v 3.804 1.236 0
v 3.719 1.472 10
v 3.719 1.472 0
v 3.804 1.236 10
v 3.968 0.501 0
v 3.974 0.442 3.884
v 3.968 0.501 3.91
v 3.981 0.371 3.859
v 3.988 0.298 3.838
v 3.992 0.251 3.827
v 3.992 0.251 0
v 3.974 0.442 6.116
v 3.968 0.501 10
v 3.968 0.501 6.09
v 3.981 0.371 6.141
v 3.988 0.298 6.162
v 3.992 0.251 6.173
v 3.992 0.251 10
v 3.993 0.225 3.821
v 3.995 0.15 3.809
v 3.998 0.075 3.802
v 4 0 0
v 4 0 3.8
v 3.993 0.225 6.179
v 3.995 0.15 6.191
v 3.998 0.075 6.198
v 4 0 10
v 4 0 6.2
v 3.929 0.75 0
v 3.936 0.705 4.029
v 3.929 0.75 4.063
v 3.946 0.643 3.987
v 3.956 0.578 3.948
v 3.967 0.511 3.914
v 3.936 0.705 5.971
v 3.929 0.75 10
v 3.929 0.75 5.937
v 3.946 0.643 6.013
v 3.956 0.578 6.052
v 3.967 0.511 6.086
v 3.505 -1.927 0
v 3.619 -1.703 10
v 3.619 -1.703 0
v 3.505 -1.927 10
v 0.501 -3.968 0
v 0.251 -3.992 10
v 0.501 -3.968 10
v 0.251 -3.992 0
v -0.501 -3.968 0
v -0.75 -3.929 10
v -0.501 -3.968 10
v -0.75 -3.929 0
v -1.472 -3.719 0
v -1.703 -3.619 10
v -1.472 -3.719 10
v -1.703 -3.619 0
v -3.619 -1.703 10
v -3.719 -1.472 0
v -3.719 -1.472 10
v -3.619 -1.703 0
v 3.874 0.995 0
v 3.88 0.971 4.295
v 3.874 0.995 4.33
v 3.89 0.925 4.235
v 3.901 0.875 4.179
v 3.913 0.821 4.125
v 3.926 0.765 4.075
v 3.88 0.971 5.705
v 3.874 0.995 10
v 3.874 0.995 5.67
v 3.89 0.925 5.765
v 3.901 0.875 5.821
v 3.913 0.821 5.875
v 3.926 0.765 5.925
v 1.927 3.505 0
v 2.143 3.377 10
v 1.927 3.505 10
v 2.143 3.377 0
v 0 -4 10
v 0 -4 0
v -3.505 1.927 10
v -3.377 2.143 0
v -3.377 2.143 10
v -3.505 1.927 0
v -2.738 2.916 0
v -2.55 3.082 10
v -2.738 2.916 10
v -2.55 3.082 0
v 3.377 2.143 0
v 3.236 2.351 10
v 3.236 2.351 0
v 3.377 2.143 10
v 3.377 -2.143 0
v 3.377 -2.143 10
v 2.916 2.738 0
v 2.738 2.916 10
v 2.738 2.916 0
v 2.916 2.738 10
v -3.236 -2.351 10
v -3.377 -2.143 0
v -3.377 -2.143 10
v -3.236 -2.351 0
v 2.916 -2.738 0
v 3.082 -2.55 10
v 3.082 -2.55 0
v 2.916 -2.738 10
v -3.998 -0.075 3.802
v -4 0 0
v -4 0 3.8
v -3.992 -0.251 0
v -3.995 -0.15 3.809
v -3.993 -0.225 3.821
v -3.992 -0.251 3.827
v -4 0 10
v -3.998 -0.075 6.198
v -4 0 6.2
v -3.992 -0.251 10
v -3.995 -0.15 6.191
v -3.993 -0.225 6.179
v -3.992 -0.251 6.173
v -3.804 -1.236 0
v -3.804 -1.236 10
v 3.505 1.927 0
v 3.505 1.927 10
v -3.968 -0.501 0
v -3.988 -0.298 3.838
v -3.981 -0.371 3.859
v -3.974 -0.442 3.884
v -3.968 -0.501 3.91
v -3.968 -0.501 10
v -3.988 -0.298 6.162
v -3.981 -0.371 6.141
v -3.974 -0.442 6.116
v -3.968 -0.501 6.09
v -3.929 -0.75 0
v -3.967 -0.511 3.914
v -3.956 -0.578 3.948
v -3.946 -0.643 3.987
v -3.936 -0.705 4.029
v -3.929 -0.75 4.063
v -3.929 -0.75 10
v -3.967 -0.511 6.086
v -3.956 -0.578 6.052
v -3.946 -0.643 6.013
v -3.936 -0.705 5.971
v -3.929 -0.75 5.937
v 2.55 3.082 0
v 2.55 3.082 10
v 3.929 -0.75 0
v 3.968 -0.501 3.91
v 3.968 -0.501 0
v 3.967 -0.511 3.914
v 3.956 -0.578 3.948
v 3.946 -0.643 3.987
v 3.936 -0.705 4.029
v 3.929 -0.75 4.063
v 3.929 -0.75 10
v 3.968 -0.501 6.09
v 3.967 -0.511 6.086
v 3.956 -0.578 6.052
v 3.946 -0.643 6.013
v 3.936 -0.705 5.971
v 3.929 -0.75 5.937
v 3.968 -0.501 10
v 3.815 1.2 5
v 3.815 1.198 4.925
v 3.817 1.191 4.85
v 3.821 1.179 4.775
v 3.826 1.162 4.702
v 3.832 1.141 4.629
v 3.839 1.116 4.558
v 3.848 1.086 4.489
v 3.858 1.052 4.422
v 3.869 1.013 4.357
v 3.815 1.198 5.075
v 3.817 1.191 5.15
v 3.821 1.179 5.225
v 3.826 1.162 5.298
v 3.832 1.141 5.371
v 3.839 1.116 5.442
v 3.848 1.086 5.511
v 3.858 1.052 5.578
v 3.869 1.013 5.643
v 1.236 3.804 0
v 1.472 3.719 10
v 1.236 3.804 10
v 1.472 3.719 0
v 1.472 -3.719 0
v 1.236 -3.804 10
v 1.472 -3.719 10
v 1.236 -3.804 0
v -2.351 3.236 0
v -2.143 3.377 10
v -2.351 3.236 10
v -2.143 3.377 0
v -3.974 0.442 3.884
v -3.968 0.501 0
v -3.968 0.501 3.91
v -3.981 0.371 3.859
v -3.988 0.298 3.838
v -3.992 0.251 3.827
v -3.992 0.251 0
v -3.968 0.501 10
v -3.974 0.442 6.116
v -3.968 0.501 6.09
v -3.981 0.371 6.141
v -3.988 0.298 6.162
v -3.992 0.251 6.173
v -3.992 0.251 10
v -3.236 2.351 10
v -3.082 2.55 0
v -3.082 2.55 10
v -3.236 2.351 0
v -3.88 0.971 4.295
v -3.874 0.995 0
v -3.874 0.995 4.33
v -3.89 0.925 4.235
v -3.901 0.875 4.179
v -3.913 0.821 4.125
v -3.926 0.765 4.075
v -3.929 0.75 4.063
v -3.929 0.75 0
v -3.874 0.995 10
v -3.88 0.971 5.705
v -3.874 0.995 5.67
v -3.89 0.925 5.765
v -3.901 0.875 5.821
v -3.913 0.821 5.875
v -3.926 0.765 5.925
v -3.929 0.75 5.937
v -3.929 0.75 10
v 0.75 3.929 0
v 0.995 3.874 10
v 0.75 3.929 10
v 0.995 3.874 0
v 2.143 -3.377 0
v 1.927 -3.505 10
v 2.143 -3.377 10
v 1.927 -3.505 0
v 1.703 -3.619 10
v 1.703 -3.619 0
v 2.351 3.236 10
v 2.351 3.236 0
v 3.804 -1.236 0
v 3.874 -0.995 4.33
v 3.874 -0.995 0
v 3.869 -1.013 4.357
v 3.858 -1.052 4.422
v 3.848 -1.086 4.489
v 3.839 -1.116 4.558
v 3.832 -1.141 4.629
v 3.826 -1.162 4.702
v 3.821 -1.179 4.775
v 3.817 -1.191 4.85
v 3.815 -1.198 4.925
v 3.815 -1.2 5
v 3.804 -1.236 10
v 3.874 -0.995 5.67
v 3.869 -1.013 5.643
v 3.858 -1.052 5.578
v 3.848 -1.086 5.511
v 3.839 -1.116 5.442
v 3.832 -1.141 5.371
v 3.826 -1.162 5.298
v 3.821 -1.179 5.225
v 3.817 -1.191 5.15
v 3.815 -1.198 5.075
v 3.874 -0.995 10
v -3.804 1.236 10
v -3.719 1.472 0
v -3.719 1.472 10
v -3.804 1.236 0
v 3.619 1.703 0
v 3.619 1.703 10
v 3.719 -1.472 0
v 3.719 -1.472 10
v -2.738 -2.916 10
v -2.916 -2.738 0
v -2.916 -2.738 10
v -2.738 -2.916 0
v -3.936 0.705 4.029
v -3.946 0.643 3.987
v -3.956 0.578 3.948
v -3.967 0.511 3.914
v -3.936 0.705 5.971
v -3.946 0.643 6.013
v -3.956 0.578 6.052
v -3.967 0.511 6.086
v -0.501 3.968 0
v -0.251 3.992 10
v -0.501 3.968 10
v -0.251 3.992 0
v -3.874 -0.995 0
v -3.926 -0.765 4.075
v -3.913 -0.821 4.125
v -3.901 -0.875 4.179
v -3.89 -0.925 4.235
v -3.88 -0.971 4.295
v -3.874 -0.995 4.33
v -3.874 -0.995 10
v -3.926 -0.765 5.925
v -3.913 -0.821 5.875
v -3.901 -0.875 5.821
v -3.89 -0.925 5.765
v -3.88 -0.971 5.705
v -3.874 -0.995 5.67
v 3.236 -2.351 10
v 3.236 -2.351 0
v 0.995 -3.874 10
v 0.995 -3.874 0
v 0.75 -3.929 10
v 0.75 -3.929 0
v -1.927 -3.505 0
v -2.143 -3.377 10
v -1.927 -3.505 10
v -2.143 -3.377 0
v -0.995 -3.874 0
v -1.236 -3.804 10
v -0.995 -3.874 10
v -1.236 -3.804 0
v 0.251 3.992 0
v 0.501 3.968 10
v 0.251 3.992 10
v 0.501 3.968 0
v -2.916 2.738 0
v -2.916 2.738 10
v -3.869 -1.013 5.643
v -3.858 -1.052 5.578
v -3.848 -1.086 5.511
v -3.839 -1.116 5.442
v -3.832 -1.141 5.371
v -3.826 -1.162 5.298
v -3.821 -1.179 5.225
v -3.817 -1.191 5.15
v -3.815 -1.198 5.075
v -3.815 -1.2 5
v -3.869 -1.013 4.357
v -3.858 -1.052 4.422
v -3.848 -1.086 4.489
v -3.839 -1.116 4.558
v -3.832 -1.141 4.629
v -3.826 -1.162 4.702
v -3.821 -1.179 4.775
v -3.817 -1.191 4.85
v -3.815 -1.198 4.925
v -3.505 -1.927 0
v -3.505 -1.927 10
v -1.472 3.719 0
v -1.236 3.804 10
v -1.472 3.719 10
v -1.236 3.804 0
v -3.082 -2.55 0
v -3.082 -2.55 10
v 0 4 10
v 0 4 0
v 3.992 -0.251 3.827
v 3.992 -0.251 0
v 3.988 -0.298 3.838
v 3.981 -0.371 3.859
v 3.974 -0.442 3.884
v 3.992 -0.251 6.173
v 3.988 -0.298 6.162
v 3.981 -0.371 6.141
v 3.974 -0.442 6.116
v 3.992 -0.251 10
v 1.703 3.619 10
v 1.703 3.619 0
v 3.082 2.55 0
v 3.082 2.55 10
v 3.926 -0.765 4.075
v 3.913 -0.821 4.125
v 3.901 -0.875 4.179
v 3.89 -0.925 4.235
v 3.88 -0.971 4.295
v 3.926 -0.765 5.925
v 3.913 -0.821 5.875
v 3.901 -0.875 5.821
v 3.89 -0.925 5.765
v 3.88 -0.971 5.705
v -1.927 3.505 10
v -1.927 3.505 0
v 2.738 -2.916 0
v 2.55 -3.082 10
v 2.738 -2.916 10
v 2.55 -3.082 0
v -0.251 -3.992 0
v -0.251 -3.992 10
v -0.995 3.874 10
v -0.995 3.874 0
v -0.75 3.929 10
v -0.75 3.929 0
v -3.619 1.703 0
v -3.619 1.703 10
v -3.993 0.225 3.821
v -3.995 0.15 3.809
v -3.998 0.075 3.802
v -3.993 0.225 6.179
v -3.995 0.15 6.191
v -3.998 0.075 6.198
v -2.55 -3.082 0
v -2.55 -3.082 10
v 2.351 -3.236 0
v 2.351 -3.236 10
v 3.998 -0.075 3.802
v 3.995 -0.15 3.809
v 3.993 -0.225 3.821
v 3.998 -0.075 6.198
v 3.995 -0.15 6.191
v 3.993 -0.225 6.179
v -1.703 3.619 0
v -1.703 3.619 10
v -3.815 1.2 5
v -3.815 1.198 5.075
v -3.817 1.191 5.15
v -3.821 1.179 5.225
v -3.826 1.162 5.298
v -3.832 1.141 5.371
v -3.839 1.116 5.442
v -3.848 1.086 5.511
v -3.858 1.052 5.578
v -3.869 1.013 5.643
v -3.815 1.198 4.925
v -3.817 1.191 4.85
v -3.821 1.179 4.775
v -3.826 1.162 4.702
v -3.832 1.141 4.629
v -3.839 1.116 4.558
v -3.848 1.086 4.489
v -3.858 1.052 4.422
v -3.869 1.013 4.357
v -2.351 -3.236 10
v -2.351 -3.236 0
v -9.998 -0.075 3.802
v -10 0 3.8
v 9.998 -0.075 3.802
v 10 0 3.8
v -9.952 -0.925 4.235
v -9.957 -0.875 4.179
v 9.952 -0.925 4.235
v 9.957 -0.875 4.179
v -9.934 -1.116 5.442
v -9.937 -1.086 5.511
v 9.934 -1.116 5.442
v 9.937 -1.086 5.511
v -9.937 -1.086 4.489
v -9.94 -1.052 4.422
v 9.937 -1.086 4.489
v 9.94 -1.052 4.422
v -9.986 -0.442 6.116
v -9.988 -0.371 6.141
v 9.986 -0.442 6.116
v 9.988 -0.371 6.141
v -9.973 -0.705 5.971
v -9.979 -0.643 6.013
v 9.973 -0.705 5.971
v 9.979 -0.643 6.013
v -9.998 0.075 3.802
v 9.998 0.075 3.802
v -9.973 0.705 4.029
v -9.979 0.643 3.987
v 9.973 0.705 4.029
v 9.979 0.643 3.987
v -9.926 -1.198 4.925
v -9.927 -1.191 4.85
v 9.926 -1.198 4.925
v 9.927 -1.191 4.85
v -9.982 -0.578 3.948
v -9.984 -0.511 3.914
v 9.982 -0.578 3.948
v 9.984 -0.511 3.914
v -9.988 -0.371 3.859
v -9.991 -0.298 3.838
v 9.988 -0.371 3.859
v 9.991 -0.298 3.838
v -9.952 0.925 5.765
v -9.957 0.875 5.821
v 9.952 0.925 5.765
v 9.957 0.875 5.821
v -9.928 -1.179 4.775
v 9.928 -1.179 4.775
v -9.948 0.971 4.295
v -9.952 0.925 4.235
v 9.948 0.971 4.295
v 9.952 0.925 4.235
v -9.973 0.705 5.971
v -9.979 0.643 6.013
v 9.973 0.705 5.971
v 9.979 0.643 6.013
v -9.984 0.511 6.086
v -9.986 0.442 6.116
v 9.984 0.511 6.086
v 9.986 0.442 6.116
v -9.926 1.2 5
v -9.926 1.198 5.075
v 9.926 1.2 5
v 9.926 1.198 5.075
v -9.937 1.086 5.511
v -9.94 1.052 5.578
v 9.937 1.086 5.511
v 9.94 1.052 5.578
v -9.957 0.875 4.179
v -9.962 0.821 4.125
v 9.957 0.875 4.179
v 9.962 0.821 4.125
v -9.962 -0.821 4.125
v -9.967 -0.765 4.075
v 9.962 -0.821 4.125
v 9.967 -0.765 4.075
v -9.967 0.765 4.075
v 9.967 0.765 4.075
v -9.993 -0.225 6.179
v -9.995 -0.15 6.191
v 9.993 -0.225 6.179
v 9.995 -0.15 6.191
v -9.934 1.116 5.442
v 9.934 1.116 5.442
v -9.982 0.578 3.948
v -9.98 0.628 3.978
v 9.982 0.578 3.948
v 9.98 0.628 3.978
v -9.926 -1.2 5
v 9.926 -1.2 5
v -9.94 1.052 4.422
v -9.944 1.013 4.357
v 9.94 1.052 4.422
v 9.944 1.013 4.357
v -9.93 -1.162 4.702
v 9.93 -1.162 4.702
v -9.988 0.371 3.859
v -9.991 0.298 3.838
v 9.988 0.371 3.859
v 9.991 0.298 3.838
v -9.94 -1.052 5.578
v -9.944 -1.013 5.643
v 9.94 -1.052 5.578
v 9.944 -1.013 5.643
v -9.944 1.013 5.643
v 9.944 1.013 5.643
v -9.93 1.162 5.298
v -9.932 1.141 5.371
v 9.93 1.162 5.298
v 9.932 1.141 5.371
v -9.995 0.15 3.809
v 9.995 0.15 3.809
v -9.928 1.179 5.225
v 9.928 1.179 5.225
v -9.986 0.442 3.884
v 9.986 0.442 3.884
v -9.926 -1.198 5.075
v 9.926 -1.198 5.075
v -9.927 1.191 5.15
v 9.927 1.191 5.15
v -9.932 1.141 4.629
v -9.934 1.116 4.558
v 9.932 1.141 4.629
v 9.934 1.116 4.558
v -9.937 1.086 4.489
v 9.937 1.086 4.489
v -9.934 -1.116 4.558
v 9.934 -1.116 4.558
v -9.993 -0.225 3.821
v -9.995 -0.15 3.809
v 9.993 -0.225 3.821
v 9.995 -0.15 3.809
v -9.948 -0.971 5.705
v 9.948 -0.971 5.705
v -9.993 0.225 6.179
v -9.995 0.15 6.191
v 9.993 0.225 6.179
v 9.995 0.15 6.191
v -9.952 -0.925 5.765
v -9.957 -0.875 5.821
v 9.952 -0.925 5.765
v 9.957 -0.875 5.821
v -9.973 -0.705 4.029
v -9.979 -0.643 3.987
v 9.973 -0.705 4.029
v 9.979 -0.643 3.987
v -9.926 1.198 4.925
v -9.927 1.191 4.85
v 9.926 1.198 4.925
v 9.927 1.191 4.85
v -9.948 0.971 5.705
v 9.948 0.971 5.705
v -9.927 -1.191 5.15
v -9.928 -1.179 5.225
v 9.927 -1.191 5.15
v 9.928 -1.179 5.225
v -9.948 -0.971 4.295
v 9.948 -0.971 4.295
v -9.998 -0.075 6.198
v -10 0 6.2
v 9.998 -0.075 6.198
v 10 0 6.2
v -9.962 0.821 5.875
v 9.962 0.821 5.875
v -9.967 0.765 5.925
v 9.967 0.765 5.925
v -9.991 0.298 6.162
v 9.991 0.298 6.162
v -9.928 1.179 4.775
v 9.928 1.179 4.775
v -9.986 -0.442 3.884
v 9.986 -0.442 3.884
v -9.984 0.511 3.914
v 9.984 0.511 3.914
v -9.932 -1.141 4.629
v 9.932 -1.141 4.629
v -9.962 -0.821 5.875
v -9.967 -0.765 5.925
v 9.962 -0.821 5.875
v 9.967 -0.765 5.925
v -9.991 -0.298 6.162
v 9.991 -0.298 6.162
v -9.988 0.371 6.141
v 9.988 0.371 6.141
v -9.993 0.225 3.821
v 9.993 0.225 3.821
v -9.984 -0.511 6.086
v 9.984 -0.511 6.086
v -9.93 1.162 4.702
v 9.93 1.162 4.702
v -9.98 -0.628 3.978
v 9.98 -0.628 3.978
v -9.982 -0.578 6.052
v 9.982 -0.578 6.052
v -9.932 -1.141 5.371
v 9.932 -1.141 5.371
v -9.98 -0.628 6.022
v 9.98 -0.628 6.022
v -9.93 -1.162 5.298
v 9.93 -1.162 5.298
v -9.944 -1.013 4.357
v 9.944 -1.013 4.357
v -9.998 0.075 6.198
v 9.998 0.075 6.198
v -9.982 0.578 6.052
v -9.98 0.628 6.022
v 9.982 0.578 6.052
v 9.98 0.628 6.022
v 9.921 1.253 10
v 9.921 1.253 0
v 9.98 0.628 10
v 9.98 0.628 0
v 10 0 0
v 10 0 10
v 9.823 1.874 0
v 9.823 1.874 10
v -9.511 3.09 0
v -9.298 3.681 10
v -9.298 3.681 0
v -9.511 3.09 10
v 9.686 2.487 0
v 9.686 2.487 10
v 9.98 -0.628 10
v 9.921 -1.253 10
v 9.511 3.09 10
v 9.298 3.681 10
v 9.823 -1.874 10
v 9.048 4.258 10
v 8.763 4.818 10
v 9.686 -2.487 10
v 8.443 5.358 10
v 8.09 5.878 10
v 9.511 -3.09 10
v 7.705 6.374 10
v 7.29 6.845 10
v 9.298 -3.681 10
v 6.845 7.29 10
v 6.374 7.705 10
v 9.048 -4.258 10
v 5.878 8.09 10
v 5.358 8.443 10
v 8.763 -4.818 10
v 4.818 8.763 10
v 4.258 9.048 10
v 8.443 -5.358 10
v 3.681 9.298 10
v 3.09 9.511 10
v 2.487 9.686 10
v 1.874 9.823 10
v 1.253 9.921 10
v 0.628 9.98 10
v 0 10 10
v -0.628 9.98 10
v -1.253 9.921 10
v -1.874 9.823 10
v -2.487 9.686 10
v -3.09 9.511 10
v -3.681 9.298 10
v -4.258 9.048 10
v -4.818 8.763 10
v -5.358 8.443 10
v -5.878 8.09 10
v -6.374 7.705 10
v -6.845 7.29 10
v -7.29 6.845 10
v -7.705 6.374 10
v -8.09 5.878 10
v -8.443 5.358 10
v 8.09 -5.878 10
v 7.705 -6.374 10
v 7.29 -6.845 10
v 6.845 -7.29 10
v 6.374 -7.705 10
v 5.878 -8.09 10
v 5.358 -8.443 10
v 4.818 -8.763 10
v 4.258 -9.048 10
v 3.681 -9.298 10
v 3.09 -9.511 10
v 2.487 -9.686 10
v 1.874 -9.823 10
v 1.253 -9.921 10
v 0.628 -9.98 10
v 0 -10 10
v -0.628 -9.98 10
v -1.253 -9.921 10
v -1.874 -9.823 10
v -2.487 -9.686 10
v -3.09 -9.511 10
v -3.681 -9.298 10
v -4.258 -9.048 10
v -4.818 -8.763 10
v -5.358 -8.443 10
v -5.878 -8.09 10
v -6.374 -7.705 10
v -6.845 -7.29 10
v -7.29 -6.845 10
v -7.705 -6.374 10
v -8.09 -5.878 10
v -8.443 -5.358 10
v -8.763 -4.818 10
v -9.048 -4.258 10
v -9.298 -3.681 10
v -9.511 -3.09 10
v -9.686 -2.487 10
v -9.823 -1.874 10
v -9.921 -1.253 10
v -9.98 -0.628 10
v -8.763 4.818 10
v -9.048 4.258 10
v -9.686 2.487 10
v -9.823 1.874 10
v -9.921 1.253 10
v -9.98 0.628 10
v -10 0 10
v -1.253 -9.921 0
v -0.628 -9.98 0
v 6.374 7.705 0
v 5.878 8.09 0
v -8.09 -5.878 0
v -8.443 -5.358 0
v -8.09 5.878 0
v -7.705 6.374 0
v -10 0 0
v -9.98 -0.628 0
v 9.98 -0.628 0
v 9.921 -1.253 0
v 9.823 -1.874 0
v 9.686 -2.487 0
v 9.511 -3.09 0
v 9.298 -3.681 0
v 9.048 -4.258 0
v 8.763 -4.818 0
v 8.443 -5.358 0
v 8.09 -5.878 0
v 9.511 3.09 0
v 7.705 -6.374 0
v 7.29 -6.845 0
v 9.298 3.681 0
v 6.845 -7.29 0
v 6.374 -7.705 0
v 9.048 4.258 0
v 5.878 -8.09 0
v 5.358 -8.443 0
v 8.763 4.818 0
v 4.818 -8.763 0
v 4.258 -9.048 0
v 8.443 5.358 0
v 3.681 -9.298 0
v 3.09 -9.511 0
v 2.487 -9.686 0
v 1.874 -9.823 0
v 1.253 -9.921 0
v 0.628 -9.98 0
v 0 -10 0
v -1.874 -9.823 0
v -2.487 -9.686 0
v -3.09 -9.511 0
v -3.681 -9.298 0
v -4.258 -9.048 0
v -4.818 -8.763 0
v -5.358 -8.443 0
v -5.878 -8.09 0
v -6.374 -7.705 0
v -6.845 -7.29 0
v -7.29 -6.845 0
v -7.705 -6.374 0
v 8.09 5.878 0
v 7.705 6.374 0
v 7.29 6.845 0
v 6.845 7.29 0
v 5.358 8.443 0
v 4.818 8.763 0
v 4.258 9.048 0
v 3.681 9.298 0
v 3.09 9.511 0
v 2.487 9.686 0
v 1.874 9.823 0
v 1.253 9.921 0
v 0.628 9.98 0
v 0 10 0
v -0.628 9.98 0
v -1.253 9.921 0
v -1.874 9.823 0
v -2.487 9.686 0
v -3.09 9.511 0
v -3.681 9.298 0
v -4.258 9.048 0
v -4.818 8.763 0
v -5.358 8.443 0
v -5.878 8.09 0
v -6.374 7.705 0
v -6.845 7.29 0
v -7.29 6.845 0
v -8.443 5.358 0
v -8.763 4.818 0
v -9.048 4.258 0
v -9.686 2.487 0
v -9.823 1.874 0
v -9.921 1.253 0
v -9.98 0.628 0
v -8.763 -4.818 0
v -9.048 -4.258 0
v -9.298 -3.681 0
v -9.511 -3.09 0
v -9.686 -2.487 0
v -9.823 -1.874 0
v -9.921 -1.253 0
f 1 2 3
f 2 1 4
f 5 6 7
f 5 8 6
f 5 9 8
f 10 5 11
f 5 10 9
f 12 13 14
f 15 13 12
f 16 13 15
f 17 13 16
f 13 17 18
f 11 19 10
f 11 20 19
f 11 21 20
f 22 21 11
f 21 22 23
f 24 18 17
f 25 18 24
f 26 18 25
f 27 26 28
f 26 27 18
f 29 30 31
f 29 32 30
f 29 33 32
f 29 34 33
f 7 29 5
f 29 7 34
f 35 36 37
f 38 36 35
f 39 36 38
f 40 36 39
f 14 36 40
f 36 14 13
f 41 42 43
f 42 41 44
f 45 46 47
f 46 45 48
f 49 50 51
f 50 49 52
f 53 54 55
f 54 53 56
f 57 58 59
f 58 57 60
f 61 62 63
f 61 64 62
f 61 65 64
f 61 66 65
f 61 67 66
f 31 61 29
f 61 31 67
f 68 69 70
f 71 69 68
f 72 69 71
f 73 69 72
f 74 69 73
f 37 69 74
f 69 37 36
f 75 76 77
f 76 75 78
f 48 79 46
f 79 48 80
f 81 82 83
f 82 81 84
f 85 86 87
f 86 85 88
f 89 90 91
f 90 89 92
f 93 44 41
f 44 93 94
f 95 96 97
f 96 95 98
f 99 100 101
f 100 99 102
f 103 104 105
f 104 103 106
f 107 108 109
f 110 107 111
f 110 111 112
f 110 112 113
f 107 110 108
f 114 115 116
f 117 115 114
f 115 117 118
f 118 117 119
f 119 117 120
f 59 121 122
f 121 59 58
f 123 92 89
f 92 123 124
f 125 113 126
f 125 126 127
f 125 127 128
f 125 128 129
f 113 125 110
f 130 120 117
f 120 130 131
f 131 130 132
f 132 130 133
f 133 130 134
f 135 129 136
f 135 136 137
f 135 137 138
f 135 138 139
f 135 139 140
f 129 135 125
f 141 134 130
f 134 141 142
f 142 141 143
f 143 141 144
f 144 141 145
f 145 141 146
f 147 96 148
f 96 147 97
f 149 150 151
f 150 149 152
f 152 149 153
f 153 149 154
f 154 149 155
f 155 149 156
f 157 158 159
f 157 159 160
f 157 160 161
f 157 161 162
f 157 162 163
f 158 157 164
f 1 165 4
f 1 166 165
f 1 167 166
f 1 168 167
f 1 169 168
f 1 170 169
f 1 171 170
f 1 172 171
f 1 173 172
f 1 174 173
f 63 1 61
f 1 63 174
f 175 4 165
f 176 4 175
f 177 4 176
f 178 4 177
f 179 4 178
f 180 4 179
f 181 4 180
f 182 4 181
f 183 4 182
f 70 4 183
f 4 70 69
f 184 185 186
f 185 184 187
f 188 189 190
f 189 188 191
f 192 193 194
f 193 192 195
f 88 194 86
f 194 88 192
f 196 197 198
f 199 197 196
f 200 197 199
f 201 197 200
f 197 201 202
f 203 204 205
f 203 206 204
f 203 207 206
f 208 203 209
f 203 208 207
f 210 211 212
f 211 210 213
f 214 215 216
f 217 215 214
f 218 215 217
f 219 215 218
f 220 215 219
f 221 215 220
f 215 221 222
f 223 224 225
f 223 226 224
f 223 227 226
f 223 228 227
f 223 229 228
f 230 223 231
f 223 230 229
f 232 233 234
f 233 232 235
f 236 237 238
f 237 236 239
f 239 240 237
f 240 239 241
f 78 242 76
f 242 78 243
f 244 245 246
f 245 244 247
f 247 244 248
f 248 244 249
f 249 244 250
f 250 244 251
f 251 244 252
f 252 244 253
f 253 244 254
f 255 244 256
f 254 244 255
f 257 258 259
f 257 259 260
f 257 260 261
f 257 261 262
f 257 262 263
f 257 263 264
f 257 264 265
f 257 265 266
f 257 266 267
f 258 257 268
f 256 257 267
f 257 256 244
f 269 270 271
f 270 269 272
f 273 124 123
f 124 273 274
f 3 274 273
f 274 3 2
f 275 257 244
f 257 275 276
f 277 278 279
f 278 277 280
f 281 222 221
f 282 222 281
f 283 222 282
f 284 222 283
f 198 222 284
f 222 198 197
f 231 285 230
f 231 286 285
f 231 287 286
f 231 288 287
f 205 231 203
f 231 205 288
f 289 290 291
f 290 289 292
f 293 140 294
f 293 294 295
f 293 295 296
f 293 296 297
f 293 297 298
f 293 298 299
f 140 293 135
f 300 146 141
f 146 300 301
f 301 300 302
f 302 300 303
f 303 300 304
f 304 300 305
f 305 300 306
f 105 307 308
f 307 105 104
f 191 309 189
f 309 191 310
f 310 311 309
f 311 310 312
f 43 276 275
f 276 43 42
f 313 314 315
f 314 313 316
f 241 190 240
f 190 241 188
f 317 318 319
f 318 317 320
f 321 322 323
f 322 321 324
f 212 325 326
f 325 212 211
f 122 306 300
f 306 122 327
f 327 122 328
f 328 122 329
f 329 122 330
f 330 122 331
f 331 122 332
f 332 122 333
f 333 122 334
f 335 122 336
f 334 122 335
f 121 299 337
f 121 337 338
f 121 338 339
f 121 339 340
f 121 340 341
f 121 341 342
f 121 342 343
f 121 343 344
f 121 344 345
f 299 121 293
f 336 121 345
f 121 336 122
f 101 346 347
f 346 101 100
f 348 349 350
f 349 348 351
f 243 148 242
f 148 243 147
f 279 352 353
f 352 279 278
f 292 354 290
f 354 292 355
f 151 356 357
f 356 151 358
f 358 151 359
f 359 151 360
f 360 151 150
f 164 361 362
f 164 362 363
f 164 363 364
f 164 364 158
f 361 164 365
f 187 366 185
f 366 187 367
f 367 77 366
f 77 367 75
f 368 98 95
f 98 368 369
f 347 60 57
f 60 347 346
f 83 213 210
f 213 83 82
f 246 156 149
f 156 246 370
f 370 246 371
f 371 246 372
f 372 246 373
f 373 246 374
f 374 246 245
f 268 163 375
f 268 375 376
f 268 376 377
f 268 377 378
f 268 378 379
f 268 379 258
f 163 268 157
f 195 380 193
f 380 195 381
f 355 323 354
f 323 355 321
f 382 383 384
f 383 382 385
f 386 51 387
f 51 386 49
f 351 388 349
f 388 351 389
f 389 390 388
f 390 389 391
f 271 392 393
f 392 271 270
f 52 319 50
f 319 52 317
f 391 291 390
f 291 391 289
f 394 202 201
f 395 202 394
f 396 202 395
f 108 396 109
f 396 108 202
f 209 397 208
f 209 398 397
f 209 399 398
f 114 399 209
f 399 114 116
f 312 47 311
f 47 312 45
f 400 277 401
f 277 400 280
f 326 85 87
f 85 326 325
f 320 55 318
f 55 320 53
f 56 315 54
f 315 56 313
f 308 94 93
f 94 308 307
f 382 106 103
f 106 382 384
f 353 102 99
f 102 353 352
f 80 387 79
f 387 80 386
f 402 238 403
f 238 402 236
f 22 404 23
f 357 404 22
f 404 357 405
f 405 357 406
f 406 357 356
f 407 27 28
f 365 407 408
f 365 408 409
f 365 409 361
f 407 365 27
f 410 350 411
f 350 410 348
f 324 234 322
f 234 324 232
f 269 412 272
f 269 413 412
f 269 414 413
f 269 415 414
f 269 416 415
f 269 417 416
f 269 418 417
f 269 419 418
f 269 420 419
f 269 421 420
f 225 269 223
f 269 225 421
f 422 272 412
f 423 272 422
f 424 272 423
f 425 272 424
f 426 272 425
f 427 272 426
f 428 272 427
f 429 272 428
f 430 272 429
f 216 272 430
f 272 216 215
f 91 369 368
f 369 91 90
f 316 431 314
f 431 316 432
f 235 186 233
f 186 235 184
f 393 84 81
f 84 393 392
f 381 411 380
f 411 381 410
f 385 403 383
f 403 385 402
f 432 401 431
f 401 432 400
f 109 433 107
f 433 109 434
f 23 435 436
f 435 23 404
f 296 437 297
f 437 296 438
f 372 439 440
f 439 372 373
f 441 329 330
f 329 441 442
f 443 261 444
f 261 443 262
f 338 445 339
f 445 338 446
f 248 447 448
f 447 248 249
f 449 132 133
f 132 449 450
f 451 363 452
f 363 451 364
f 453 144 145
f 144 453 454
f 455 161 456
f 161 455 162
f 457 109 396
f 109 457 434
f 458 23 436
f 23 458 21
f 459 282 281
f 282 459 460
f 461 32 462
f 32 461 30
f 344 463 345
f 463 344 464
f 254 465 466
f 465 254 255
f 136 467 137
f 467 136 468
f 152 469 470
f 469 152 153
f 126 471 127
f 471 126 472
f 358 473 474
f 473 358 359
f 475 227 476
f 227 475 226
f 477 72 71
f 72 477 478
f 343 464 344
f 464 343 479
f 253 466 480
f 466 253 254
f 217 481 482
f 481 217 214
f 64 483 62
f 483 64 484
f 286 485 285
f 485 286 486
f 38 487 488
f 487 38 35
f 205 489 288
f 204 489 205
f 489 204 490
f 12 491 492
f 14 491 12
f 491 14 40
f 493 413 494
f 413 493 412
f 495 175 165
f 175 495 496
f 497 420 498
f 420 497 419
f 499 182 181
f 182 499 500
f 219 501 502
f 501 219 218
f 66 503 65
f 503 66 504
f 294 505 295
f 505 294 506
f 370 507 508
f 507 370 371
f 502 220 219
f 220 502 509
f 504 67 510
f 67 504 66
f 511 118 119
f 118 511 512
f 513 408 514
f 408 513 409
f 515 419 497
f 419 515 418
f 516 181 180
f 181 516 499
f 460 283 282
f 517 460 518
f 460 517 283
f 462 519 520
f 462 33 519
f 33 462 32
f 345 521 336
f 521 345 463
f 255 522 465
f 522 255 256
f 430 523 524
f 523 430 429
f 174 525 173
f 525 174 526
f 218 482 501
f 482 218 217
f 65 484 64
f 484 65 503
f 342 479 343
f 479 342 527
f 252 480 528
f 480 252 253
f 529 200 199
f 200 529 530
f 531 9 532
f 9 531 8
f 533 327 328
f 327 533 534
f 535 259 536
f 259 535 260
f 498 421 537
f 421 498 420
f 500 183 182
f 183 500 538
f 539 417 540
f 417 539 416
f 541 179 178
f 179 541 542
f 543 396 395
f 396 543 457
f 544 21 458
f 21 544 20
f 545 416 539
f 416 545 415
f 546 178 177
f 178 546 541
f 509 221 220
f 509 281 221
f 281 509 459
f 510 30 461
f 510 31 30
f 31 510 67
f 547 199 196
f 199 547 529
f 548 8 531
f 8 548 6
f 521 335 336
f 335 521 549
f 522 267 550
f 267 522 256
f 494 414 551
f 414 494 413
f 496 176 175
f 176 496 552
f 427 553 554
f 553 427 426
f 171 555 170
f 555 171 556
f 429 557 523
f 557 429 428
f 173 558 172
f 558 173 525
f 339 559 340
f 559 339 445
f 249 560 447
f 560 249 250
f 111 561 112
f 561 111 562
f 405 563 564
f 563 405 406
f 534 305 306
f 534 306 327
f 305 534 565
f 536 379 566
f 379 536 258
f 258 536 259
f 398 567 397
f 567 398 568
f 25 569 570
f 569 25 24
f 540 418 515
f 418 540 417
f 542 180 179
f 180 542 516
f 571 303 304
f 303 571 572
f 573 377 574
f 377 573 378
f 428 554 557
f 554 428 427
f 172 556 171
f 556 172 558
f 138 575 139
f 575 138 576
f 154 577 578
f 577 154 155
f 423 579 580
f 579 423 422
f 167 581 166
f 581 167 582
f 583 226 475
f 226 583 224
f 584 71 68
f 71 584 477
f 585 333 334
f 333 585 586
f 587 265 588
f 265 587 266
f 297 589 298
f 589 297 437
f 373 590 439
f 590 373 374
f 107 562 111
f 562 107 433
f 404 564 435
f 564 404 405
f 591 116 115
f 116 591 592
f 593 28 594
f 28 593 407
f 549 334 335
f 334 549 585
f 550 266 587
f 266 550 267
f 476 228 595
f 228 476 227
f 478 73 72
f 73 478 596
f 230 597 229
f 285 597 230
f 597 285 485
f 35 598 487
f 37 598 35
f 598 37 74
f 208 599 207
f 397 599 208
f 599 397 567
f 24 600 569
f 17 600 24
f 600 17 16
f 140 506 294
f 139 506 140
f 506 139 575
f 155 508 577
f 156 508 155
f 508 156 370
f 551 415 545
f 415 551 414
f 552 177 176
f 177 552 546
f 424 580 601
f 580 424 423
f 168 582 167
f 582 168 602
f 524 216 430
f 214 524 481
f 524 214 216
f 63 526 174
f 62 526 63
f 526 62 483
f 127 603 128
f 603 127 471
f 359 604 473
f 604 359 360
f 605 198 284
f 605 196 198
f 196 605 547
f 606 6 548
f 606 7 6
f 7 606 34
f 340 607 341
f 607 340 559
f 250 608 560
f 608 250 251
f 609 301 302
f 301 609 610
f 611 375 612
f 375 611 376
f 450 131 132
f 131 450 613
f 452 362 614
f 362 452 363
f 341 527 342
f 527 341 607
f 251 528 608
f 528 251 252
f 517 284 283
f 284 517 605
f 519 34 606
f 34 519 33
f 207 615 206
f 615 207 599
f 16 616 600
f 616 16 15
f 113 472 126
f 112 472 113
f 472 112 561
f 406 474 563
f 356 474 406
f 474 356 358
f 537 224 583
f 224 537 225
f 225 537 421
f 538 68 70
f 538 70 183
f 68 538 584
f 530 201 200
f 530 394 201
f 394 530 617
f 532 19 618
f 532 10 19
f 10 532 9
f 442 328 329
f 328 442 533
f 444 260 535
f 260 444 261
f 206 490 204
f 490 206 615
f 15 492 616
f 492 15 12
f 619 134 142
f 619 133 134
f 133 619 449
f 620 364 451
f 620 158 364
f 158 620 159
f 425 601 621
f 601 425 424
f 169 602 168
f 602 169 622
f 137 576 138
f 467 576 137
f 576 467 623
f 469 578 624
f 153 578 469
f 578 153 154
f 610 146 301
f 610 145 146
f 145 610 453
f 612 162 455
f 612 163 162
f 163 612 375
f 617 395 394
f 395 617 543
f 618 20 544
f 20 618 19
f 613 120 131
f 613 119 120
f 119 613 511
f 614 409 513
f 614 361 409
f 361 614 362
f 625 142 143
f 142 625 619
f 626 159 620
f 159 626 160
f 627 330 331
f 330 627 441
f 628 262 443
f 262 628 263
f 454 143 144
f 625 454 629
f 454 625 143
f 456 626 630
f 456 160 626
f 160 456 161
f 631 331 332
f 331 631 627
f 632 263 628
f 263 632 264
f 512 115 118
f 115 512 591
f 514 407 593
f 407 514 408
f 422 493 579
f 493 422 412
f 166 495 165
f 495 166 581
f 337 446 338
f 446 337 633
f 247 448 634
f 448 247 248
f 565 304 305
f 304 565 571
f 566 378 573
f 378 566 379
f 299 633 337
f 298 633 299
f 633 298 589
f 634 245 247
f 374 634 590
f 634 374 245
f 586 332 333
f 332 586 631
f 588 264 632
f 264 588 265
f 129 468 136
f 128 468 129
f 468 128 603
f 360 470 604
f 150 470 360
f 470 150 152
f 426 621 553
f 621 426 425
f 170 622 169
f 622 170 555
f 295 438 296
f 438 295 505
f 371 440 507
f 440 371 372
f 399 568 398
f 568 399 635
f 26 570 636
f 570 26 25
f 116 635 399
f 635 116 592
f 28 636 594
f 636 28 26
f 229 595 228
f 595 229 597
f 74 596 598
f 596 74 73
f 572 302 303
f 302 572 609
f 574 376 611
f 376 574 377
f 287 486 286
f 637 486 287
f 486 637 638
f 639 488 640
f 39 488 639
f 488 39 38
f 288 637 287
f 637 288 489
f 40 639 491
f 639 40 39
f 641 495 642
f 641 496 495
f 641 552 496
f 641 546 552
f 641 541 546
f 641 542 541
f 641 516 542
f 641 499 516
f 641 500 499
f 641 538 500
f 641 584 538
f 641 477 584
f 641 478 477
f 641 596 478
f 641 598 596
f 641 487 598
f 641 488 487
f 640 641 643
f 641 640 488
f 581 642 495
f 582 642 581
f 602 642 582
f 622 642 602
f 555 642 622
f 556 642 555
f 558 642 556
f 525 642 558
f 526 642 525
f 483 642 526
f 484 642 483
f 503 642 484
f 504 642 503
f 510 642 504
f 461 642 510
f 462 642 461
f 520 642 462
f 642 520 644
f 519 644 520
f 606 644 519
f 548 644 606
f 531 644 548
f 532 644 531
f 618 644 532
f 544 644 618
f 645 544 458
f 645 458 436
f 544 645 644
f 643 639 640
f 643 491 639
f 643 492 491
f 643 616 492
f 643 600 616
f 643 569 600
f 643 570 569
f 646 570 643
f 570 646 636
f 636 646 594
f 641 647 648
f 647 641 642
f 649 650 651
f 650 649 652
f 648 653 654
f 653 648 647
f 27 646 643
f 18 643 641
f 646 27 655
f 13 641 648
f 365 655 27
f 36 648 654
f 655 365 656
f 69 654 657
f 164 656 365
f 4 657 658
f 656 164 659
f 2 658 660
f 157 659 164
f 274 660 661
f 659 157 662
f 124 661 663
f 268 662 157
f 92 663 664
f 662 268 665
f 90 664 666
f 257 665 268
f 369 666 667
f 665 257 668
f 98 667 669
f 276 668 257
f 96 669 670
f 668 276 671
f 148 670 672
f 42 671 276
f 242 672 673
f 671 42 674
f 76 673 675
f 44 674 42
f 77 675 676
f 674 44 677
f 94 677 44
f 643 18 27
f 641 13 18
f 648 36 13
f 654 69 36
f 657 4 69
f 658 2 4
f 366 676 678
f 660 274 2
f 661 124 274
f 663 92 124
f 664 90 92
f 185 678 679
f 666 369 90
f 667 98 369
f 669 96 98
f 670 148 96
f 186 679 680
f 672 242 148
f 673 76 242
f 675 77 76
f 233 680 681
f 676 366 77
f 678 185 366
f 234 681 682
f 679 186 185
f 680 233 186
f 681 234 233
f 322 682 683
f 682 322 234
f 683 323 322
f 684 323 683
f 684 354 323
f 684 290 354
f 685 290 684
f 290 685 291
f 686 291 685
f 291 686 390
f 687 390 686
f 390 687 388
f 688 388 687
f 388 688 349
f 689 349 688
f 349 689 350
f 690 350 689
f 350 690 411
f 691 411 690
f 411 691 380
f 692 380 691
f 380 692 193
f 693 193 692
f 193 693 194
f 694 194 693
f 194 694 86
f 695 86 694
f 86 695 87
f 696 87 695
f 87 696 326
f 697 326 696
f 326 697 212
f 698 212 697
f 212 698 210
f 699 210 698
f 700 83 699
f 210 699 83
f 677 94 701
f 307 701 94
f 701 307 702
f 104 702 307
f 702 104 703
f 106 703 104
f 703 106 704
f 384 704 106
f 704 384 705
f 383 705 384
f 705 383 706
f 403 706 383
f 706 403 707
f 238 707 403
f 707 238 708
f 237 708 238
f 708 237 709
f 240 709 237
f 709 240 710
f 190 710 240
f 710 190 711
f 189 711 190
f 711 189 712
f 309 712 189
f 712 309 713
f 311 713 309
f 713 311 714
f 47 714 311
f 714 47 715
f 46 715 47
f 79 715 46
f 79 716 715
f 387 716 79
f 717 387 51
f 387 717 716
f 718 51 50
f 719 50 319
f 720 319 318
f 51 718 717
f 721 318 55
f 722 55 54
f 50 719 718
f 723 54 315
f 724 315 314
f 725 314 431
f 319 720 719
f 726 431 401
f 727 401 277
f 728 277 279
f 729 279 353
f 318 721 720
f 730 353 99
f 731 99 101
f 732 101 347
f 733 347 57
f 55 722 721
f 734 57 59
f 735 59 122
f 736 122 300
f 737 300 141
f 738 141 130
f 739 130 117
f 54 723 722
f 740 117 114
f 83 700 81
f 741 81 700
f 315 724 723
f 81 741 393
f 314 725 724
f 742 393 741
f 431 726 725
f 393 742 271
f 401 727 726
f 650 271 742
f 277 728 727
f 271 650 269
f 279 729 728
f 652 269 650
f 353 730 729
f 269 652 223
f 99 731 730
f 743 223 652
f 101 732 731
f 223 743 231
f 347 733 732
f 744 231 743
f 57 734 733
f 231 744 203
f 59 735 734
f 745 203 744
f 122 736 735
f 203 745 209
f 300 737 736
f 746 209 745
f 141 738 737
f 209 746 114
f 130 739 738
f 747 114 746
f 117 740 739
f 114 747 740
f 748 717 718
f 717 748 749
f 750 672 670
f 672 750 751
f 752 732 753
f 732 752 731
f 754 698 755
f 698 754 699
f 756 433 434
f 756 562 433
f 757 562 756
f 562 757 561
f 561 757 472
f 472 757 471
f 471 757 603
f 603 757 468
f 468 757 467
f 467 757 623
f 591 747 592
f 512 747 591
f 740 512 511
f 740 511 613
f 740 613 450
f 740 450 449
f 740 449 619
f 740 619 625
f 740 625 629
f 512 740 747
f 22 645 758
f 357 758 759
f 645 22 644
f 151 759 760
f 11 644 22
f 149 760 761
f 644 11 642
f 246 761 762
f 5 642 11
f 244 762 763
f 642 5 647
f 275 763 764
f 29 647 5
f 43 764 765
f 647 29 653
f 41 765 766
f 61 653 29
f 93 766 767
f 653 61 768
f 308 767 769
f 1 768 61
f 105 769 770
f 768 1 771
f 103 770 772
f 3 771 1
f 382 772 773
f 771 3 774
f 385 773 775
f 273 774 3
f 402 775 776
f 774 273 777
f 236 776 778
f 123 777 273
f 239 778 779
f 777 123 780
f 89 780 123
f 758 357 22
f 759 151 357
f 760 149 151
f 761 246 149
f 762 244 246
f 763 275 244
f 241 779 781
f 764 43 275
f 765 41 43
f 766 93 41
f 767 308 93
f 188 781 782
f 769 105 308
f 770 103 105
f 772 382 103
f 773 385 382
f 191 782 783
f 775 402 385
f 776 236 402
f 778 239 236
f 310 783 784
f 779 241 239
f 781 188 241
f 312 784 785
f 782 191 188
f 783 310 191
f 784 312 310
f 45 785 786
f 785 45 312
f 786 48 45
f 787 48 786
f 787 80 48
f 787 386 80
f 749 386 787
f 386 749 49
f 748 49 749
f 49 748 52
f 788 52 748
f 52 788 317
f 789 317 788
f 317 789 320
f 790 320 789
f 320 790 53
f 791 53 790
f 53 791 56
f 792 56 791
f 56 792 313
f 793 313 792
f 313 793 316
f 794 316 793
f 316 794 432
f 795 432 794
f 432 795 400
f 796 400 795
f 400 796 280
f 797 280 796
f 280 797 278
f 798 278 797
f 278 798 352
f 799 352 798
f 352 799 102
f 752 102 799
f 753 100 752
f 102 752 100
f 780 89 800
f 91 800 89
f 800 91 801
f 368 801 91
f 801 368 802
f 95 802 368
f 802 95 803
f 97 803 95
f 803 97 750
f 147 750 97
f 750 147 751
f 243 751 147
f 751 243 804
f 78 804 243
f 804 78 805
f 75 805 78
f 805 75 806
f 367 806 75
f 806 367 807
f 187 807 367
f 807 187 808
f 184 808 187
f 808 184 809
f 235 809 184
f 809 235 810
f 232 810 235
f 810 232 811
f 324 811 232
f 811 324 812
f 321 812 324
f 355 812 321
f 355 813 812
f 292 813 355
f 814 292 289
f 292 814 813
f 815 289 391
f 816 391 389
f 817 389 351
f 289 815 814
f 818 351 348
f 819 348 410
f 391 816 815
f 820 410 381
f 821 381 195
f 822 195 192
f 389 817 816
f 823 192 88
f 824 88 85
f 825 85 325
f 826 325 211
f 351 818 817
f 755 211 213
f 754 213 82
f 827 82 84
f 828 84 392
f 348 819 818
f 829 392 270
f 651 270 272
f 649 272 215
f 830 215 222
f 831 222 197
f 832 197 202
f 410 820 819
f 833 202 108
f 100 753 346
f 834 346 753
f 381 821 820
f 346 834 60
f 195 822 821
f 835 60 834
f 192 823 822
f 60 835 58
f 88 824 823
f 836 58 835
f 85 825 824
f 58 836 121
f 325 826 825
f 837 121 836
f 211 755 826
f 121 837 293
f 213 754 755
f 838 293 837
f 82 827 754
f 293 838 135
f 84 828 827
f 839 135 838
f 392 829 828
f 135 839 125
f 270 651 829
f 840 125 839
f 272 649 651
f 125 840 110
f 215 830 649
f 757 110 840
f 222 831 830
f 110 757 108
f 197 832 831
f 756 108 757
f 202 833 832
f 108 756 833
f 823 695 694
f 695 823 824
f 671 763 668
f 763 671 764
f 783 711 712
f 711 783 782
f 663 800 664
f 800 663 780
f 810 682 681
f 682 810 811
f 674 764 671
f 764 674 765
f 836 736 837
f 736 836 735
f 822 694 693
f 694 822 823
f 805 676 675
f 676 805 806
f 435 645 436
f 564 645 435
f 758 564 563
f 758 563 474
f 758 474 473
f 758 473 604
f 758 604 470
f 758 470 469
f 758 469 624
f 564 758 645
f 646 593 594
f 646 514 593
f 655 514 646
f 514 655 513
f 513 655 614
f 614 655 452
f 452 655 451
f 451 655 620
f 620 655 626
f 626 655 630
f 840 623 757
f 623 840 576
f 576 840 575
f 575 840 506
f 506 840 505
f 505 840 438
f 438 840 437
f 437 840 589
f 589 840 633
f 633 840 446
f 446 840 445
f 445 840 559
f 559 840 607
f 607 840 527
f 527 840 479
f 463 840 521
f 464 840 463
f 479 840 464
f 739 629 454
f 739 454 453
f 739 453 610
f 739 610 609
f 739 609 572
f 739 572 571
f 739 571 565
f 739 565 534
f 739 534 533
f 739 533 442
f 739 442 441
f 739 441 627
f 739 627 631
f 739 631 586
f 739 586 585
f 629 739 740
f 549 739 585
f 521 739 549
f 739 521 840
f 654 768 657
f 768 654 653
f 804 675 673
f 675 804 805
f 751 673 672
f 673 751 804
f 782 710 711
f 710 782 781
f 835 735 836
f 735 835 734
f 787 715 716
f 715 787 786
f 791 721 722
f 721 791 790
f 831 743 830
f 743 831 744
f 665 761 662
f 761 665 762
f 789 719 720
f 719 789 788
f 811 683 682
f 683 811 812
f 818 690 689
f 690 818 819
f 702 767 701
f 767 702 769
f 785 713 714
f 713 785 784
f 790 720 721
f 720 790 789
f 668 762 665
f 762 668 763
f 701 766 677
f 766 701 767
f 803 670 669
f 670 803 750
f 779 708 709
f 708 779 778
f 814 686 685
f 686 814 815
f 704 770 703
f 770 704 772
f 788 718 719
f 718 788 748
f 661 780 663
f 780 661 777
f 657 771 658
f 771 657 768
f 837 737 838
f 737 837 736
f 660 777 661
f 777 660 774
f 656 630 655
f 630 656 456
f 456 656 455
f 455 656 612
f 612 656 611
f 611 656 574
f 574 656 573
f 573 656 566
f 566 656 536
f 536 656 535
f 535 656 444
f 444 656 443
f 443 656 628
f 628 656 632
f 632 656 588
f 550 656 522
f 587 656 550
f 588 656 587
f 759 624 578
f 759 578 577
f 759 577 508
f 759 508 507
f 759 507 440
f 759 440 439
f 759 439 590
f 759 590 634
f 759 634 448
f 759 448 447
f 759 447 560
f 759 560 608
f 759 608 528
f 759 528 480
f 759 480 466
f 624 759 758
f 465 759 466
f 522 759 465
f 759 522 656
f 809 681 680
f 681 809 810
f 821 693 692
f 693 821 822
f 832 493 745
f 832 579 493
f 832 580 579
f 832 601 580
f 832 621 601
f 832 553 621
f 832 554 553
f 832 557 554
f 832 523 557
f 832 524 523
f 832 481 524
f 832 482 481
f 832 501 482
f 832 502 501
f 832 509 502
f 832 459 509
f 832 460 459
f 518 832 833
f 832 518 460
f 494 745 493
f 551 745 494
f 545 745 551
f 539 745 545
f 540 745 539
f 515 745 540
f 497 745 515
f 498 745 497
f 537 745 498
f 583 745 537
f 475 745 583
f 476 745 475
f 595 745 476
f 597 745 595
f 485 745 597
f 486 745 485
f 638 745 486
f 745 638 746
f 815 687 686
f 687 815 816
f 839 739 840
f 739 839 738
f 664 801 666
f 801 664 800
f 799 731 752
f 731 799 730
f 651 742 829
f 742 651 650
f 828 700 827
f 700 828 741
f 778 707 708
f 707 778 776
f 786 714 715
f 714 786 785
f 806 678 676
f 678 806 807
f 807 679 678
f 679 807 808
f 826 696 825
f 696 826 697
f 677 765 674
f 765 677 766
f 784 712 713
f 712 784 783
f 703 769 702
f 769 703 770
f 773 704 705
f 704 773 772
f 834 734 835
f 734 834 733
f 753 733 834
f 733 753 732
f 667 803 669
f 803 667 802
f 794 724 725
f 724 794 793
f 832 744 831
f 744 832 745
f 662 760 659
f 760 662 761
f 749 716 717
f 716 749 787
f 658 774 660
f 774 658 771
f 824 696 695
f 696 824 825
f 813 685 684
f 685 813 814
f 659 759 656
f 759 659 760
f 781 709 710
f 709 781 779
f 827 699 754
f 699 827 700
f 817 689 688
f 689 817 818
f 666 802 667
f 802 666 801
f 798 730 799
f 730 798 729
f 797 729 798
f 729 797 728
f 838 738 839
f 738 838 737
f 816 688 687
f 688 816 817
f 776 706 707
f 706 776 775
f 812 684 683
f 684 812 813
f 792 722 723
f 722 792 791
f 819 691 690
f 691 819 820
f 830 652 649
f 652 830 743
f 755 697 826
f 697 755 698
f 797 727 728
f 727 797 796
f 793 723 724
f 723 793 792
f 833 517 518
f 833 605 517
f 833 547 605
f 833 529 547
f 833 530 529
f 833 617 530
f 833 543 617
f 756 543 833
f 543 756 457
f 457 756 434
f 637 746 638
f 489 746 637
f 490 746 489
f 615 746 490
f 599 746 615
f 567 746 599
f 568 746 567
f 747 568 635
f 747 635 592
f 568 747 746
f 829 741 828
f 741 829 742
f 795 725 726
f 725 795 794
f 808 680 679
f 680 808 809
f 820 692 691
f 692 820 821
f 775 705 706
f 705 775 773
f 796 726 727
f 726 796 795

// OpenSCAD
difference(){
	union(){
        translate([0,0,0]){
            rotate([0,0,0]){
                cylinder(h=10, r=10, $fn=100, center=false);
            }
        }


	}
	union() {

        translate([0,0,-1]){
            rotate([0,0,0]){
                cylinder(h=12, r=4, $fn=100, center=false);
            }
        }
        translate([-30,0,5]){
            rotate([0,90,0]){
                cylinder(h=100, r=1.2, $fn=100, center=false);
            }
        }


	}
}
